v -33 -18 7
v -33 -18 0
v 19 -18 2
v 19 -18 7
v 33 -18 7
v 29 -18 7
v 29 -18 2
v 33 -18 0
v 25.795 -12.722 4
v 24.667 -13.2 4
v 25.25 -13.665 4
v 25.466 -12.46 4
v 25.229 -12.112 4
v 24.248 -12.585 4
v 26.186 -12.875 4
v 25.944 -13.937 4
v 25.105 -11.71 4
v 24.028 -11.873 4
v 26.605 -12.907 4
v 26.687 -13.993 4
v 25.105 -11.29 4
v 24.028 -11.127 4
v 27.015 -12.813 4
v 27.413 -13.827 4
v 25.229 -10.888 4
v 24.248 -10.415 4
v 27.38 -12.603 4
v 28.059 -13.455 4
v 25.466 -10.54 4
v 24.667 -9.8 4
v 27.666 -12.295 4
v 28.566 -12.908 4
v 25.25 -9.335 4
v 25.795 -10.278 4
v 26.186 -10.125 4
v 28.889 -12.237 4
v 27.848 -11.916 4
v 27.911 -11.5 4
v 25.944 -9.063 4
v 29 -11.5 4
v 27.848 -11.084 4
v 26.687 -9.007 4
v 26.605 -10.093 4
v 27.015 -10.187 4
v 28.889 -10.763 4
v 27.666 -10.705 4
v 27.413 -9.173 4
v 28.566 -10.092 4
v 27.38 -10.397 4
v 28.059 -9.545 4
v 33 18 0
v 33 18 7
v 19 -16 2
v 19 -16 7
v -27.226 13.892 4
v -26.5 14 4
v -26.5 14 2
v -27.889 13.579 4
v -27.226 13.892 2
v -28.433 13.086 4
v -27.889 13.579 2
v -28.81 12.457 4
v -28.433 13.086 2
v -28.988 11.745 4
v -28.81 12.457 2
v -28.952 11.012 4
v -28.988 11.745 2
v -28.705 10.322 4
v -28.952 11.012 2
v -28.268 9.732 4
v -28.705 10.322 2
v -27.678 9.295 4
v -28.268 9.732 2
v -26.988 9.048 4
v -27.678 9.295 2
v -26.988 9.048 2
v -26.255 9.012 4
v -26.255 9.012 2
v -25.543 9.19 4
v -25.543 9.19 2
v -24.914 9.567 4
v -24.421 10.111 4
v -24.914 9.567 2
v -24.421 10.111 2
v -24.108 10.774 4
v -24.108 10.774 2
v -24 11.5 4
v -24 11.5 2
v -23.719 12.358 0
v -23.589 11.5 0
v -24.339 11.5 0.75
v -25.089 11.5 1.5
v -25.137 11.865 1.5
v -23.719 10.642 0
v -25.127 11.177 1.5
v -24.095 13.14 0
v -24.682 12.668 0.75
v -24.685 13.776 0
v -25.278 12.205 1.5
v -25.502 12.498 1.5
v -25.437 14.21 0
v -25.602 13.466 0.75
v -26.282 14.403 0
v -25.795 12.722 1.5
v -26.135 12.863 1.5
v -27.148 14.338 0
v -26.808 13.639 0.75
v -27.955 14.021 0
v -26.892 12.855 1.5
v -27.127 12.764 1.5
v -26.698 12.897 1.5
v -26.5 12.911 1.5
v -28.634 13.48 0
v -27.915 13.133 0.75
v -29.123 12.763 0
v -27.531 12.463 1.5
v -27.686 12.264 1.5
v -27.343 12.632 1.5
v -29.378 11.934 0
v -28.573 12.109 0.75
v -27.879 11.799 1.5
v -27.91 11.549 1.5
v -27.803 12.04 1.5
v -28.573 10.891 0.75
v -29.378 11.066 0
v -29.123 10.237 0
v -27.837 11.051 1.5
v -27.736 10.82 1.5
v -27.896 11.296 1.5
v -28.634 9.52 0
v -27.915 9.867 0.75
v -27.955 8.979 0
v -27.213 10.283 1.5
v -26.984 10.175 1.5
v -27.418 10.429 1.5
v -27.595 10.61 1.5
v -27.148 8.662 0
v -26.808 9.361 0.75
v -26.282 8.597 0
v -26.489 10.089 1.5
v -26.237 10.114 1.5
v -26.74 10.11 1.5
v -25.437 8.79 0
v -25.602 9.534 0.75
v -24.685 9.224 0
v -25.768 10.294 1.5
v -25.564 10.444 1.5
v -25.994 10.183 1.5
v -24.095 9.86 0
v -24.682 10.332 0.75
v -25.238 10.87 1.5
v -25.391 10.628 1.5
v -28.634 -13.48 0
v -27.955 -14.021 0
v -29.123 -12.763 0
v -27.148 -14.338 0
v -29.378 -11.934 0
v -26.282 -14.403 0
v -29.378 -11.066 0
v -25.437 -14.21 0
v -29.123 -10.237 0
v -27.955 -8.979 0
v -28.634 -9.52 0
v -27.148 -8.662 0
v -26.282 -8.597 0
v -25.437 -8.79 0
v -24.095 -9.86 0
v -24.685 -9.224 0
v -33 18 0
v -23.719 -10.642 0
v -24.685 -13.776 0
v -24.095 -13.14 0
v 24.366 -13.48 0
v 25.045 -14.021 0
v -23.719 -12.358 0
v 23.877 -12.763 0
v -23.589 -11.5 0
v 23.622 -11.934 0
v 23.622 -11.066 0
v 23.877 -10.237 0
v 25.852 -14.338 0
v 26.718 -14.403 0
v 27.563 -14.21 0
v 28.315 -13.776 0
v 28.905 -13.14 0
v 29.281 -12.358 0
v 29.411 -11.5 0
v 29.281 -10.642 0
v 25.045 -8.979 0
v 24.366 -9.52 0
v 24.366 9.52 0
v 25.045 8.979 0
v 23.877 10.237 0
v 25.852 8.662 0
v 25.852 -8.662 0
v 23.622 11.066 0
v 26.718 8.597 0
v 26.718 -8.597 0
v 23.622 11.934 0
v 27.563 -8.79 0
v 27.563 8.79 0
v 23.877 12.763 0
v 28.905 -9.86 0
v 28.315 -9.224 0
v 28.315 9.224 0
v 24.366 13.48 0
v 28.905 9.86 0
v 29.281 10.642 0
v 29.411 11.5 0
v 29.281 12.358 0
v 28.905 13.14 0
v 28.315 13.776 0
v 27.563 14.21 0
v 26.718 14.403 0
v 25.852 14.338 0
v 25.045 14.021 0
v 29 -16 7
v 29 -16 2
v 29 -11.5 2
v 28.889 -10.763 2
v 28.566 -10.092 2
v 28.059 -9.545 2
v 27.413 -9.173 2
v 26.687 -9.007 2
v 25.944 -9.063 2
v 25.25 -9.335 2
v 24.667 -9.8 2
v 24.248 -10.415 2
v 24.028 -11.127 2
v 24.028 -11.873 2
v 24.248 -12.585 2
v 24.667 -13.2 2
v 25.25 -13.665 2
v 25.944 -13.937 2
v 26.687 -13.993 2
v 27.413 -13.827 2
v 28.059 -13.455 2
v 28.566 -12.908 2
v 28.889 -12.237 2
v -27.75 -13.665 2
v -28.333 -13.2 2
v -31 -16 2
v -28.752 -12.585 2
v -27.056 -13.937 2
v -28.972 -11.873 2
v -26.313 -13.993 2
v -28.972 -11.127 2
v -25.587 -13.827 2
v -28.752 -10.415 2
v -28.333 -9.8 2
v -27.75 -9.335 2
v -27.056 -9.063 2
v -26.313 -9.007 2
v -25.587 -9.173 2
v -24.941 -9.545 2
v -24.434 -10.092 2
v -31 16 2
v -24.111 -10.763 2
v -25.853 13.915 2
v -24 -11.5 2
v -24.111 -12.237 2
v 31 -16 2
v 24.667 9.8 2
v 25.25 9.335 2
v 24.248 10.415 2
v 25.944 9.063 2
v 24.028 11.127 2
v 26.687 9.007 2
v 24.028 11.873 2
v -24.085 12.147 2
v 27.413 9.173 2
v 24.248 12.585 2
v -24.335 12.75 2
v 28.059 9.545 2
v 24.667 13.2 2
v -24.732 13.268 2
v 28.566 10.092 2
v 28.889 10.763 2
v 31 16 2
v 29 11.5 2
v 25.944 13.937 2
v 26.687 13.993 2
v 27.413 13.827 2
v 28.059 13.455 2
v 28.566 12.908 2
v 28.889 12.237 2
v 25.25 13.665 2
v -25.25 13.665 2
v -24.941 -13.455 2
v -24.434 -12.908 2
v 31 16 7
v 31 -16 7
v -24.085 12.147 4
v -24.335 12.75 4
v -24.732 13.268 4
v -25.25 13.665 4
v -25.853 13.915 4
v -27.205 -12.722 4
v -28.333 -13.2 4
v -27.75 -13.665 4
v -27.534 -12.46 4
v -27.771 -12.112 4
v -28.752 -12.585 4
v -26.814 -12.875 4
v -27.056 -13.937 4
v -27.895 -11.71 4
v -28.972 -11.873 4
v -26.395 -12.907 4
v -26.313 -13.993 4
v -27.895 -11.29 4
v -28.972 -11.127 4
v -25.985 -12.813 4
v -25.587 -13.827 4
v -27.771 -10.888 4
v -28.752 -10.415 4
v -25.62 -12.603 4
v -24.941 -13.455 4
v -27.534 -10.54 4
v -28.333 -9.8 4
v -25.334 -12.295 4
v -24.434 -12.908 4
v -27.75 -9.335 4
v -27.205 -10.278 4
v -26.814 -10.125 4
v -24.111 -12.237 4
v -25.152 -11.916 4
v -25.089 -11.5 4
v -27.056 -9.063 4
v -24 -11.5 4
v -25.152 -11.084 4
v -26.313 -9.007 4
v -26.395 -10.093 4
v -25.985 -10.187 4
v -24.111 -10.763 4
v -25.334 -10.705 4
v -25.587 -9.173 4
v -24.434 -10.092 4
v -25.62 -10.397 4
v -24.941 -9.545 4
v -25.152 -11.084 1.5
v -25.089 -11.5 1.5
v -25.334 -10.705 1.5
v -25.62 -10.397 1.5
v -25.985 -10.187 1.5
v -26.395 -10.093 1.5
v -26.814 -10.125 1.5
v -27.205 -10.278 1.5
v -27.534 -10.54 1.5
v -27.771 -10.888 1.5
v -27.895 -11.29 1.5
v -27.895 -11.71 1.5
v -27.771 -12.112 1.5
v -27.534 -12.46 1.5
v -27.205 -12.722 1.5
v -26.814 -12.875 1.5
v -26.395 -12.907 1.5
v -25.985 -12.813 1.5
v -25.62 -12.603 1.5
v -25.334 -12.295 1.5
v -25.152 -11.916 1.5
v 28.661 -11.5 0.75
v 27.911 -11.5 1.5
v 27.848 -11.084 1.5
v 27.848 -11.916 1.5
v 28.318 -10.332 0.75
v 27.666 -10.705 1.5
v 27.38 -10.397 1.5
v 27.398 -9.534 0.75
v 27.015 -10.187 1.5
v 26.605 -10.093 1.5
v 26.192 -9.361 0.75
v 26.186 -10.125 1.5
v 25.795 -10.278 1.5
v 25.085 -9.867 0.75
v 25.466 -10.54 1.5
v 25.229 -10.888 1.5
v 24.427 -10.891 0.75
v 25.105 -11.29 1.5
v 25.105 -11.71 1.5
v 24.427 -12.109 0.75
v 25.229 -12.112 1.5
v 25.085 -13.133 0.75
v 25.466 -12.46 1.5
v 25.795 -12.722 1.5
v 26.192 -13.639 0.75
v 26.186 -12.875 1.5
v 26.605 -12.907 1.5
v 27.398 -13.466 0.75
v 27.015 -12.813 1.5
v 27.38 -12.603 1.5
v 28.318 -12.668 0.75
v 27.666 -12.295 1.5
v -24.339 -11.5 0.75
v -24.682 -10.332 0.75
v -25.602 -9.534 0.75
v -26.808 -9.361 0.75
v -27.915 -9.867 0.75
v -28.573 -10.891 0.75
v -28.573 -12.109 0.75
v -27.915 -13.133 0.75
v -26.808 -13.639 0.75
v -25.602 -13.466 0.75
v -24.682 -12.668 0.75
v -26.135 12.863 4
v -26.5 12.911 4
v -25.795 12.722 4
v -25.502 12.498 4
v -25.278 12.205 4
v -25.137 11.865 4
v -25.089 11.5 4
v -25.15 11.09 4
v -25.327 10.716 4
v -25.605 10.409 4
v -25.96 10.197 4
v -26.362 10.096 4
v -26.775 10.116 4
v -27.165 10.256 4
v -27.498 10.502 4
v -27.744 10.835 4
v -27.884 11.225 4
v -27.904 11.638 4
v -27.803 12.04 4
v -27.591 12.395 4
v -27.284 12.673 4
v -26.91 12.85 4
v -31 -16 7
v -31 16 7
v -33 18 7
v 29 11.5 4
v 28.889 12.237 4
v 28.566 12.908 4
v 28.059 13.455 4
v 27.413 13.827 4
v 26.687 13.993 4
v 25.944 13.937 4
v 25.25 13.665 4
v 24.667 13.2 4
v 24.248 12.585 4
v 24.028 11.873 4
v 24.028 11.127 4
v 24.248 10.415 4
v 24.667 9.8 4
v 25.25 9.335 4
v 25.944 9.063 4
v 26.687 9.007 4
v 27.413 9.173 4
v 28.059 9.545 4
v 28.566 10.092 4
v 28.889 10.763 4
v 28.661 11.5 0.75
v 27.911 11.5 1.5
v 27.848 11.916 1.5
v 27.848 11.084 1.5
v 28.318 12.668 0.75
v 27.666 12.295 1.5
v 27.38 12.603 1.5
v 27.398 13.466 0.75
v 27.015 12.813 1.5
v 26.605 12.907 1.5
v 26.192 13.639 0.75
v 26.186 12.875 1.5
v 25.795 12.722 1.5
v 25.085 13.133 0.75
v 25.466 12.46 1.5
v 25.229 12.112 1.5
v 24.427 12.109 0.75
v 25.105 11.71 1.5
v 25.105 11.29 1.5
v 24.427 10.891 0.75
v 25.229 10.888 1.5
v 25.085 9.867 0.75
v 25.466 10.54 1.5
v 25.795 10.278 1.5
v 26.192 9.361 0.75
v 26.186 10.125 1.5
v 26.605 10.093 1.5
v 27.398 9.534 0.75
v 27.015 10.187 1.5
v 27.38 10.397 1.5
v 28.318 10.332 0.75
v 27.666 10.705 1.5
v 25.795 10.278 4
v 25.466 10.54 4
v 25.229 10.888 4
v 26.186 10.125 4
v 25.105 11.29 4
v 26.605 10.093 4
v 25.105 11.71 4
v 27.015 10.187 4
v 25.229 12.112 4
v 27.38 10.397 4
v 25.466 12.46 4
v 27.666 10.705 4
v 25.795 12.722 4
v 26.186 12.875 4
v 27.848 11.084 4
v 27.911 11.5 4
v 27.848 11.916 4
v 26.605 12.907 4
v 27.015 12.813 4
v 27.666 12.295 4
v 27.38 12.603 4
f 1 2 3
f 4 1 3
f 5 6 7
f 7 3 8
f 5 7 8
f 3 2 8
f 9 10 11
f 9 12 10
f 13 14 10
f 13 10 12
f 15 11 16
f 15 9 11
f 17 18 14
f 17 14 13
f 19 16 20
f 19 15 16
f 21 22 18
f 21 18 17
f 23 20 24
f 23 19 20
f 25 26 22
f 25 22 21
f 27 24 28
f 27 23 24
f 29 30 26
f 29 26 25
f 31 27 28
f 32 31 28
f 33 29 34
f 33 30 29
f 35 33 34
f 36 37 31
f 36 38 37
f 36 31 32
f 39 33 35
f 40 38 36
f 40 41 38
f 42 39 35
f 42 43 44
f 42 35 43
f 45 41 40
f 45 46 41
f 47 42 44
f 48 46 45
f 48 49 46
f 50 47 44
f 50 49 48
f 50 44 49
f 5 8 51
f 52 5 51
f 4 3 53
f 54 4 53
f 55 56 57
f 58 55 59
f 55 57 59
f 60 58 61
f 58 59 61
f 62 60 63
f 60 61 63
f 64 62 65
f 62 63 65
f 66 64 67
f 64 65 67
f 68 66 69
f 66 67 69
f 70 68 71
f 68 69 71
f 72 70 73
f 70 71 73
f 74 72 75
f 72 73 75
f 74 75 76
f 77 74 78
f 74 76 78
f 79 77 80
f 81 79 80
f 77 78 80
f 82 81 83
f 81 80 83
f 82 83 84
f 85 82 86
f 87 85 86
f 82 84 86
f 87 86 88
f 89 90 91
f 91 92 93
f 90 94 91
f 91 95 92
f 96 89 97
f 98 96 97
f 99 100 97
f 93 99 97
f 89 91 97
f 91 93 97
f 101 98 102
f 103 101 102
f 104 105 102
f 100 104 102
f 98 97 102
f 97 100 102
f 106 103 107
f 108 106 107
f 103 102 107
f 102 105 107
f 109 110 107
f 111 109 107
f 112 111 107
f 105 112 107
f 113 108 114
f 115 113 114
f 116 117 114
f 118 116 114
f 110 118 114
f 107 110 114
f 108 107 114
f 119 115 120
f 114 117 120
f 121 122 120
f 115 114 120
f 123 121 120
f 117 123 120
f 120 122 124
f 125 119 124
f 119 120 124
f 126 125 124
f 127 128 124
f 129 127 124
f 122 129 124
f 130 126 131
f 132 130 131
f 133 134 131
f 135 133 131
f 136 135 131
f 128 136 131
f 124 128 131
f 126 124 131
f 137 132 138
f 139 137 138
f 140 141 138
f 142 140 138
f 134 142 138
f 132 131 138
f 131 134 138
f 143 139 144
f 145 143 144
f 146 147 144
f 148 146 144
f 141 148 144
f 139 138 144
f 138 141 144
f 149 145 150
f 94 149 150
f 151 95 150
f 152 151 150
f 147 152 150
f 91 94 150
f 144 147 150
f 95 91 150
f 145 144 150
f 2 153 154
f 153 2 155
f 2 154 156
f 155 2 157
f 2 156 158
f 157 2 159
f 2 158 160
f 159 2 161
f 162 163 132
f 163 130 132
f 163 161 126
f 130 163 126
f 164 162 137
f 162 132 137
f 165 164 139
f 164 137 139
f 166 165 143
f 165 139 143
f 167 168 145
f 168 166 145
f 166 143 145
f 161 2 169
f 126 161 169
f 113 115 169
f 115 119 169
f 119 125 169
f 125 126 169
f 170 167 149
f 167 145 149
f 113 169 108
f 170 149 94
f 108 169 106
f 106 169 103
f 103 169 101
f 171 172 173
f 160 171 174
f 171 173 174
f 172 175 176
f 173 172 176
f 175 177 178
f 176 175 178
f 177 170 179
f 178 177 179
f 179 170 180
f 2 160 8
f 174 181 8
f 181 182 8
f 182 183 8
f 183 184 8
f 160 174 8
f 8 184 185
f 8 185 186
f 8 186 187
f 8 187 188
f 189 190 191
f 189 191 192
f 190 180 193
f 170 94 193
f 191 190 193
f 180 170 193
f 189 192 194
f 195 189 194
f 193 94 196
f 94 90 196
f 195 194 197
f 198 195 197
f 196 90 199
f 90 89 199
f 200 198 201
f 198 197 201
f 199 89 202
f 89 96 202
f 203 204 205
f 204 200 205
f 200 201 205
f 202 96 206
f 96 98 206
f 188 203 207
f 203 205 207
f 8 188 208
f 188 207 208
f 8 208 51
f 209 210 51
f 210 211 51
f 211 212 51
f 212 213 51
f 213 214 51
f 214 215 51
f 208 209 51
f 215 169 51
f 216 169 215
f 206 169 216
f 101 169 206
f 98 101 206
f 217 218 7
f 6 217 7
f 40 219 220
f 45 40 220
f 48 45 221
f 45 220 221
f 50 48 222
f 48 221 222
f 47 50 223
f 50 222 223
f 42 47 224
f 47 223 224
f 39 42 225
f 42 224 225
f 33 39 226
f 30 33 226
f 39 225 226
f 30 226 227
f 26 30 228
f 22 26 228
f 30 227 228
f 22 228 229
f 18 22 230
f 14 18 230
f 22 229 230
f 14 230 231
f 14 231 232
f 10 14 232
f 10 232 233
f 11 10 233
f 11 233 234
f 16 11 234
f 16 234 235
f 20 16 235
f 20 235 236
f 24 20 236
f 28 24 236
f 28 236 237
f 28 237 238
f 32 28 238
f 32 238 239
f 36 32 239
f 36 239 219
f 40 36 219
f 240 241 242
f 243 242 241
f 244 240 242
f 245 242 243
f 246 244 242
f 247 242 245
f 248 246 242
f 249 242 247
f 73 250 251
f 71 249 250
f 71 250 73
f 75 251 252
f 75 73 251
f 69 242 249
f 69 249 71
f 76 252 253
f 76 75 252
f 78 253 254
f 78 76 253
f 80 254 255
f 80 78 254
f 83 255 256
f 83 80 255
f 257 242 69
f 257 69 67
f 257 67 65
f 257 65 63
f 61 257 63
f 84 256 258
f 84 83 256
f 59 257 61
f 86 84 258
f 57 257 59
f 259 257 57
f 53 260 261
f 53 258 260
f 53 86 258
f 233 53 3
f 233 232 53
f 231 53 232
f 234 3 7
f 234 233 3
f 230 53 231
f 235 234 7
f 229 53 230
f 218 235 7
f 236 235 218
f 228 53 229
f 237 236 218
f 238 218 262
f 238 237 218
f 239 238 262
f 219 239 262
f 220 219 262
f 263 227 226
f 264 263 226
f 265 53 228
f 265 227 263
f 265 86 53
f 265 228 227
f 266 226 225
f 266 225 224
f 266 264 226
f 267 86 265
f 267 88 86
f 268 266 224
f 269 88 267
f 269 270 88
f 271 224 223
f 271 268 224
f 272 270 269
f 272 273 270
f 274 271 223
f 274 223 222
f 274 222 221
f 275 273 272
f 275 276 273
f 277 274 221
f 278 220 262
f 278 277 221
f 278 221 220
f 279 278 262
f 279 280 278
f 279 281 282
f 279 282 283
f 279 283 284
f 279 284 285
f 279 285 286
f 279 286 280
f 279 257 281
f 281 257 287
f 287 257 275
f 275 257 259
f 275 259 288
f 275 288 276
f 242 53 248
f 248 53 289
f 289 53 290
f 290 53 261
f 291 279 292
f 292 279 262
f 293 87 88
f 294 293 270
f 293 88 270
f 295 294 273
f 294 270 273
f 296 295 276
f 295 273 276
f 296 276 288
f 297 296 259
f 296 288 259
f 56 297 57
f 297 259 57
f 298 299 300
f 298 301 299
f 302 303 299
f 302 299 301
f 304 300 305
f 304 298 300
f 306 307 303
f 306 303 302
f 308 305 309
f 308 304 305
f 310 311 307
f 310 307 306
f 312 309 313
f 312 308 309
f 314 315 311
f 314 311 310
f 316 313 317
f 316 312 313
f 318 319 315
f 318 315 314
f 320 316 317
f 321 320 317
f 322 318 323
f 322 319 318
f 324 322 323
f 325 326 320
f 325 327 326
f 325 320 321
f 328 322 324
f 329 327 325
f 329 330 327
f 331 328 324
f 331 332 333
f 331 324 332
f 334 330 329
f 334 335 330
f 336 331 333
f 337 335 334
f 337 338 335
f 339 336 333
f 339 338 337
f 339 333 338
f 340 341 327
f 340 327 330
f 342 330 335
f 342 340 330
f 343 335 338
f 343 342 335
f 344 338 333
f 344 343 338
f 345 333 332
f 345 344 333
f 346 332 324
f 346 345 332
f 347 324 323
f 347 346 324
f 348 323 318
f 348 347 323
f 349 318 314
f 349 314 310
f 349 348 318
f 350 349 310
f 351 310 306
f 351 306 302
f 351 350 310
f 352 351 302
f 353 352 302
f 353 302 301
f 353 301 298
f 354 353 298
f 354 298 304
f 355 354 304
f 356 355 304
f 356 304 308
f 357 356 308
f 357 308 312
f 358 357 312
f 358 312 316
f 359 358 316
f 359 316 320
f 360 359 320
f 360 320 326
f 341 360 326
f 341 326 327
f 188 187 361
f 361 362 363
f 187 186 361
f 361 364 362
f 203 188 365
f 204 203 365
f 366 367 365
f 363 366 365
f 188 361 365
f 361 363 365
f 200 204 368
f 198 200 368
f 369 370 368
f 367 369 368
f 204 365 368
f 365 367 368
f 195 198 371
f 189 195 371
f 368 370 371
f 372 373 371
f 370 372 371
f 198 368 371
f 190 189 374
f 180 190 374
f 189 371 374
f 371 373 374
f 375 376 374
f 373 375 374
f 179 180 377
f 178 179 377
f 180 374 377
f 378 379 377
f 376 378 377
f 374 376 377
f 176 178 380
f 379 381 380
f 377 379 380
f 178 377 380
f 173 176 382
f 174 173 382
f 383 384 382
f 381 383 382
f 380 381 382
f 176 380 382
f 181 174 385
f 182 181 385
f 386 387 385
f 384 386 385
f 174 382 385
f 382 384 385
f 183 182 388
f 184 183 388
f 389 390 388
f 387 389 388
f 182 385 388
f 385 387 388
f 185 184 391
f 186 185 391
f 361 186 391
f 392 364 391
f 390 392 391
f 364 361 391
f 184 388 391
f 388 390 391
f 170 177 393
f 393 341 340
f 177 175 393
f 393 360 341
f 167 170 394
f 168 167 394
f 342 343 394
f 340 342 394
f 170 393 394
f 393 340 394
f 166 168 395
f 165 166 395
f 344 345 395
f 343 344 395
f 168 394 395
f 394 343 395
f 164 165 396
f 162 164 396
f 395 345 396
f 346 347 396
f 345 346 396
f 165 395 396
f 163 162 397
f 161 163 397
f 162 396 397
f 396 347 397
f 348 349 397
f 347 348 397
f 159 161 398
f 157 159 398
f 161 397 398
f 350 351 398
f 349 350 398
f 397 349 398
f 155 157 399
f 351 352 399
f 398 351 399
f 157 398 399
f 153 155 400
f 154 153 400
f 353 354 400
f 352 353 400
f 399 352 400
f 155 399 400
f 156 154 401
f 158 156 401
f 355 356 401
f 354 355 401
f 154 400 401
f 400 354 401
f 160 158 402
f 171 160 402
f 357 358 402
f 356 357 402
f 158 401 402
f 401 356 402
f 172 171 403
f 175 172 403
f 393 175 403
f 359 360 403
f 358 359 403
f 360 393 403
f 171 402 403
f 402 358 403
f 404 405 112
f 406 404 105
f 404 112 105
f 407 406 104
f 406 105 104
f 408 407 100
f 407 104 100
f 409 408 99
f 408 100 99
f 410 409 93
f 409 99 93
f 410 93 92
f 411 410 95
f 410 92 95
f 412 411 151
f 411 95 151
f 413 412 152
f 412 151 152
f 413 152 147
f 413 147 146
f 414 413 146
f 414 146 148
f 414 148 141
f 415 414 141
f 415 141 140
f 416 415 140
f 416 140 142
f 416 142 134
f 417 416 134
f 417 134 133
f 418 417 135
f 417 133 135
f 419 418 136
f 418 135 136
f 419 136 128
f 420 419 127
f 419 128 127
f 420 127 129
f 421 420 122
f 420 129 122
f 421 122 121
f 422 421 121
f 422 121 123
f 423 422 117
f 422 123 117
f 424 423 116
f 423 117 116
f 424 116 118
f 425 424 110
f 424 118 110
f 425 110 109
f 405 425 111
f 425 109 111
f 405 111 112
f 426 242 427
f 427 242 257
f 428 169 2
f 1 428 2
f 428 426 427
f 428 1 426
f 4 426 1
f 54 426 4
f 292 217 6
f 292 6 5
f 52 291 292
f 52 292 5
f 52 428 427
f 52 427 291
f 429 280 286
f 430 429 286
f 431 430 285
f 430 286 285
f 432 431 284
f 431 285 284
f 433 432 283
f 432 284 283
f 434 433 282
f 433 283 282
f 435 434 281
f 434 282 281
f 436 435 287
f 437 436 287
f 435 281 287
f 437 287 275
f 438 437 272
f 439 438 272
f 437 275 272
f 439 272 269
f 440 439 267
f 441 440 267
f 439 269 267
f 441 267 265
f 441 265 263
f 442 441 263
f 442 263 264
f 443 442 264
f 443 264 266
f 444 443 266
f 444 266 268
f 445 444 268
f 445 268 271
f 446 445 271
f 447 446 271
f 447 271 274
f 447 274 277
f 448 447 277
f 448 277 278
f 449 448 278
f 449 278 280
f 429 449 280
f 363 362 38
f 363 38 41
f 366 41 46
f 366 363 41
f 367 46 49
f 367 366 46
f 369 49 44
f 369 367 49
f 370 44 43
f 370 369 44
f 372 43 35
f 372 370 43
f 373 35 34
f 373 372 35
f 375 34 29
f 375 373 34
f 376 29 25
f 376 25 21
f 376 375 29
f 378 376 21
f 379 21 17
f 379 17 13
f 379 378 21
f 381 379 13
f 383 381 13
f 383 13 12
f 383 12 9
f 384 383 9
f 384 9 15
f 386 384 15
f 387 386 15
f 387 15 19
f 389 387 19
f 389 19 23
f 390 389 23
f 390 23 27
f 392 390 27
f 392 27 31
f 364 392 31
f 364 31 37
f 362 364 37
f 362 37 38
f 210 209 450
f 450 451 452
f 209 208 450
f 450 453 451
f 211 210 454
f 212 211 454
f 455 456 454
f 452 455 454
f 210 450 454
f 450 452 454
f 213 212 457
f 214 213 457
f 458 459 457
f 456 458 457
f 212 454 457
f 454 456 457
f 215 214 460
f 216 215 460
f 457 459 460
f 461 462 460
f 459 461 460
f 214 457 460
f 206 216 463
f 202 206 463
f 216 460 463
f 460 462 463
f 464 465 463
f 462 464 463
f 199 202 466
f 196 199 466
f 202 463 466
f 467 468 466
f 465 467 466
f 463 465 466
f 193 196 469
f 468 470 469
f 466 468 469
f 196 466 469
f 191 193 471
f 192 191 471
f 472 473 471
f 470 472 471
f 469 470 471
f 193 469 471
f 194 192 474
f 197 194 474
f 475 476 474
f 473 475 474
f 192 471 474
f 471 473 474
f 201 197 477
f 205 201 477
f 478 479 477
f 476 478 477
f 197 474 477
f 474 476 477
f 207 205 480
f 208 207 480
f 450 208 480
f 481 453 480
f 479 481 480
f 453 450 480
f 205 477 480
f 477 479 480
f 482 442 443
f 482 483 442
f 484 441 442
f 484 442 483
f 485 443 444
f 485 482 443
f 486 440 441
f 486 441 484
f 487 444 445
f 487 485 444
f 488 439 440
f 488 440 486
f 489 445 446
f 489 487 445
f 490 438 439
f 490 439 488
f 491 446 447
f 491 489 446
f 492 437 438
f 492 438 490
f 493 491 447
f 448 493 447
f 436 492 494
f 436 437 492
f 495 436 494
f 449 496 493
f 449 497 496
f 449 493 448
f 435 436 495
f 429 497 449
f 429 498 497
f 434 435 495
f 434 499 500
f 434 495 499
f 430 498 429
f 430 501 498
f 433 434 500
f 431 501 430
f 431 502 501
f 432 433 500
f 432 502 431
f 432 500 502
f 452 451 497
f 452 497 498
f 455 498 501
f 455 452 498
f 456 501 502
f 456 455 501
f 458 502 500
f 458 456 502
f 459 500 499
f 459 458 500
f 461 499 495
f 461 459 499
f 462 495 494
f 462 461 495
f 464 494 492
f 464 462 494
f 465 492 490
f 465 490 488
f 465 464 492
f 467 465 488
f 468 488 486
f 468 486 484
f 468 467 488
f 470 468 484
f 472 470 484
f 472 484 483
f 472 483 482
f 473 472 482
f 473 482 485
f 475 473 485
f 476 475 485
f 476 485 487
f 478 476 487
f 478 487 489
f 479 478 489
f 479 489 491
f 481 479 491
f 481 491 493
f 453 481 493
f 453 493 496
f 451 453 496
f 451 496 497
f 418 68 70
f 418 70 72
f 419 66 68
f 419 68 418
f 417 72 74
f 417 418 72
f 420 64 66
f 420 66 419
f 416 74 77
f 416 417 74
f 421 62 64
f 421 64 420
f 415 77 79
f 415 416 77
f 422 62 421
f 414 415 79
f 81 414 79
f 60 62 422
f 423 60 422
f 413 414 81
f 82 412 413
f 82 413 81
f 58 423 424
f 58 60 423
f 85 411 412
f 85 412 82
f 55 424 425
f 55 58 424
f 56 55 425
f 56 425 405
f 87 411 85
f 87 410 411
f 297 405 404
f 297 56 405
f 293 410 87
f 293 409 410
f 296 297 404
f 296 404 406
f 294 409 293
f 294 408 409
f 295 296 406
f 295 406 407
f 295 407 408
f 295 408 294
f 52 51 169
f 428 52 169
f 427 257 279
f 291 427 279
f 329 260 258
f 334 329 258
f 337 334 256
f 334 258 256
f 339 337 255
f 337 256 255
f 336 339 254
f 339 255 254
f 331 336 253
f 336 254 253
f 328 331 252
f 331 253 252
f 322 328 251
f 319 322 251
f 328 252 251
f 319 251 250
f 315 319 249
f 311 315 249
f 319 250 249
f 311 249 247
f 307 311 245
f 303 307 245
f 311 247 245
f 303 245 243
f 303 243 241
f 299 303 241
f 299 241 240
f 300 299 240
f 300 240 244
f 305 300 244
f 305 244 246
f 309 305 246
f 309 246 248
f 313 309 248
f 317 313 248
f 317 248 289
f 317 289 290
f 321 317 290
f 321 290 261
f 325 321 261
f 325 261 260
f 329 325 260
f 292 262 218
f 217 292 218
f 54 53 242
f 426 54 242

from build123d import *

# Parameters (mm, degrees)
F0_R     = 2.5
F0_R_2   = 1.4107797467
F0_W     = 10
F0_H     = 2
F1_DEPTH = 2
F2_DEPTH = 4
F3_DEPTH = 7


# Not quite as in the source:
# - a fillet or chamfer that OpenCascade refuses, or shapes differently, is made with other operations: its cross-section is extruded or revolved along the edge and cut away or added


with BuildPart() as f1:
    # F0 (on Top) → F1 (new body)
    with BuildSketch(Plane.XY):
        Polygon((19, -18), (19, -16), (10.7328139991, -16), (-31, -16), (-31, 16), (31, 16), (31, -16), (29, -16), (29, -18), (33, -18), (33, 18), (-33, 18), (-33, -18), align=None)
        Polygon((-30, -15), (-30, 15), (-26.5, 15), (30, 15), (30, -15), (29, -15), (29, -16), (31, -16), (31, 16), (-31, 16), (-31, -16), (10.7328139991, -16), (19, -16), (19, -15), align=None)
        Polygon((-26.5, 15), (-30, 15), (-30, -15), (19, -15), (24, -15), (29, -15), (30, -15), (30, 15), align=None)
        with Locations((-26.5, -11.5)):
            Circle(F0_R, mode=Mode.SUBTRACT)
        with Locations((26.5, -11.5)):
            Circle(F0_R, mode=Mode.SUBTRACT)
        with BuildLine():
            ThreePointArc((-24, 11.5), (-28.267766953, 9.732233047), (-26.5, 14))
            ThreePointArc((-26.5, 14), (-24.732233047, 13.267766953), (-24, 11.5))
        make_face(mode=Mode.SUBTRACT)
        with Locations((26.5, 11.5)):
            Circle(F0_R, mode=Mode.SUBTRACT)
        with BuildLine():
            ThreePointArc((-24, 11.5), (-24.732233047, 13.267766953), (-26.5, 14))
            ThreePointArc((-26.5, 14), (-28.267766953, 9.732233047), (-24, 11.5))
        make_face()
        with BuildLine():
            ThreePointArc((-25.0892202533, 11.5), (-27.4975719256, 10.5024280744), (-26.5, 12.9107797467))
            ThreePointArc((-26.5, 12.9107797467), (-25.5024280744, 12.4975719256), (-25.0892202533, 11.5))
        make_face(mode=Mode.SUBTRACT)
        with Locations((-26.5, -11.5)):
            Circle(F0_R)
        with Locations((-26.5, -11.5)):
            Circle(F0_R_2, mode=Mode.SUBTRACT)
        with Locations((26.5, -11.5)):
            Circle(F0_R)
        with Locations((26.5, -11.5)):
            Circle(F0_R_2, mode=Mode.SUBTRACT)
        with Locations((26.5, 11.5)):
            Circle(F0_R)
        with Locations((26.5, 11.5)):
            Circle(F0_R_2, mode=Mode.SUBTRACT)
        Polygon((24, -15), (19, -15), (19, -16), (29, -16), (29, -15), align=None)
        with Locations((24, -17)):
            Rectangle(F0_W, F0_H)
    extrude(amount=F1_DEPTH)

    # F0 (on Top) → F2 (join)
    with BuildSketch(Plane.XY):
        with Locations((-26.5, -11.5)):
            Circle(F0_R)
        with Locations((-26.5, -11.5)):
            Circle(F0_R_2, mode=Mode.SUBTRACT)
        with BuildLine():
            ThreePointArc((-24, 11.5), (-24.732233047, 13.267766953), (-26.5, 14))
            ThreePointArc((-26.5, 14), (-28.267766953, 9.732233047), (-24, 11.5))
        make_face()
        with BuildLine():
            ThreePointArc((-25.0892202533, 11.5), (-27.4975719256, 10.5024280744), (-26.5, 12.9107797467))
            ThreePointArc((-26.5, 12.9107797467), (-25.5024280744, 12.4975719256), (-25.0892202533, 11.5))
        make_face(mode=Mode.SUBTRACT)
        with Locations((26.5, -11.5)):
            Circle(F0_R)
        with Locations((26.5, -11.5)):
            Circle(F0_R_2, mode=Mode.SUBTRACT)
        with Locations((26.5, 11.5)):
            Circle(F0_R)
        with Locations((26.5, 11.5)):
            Circle(F0_R_2, mode=Mode.SUBTRACT)
    extrude(amount=F2_DEPTH)

    # F0 (on Top) → F3 (join)
    with BuildSketch(Plane.XY):
        Polygon((19, -18), (19, -16), (10.7328139991, -16), (-31, -16), (-31, 16), (31, 16), (31, -16), (29, -16), (29, -18), (33, -18), (33, 18), (-33, 18), (-33, -18), align=None)
    extrude(amount=F3_DEPTH)

    # F4: chamfer of 1.5 on 4 edges, made by hand

    # F4_s1 → F4_t2 (revolve, cut)
    with BuildSketch(Plane.XZ.offset(11.5)):
        with BuildLine():
            Line((29.4532061535, -0.0424264069), (27.8683533398, 1.5424264069))
            Line((27.8683533398, 1.5424264069), (27.8383533398, 1.5424264069))
            ThreePointArc((27.8383533398, 1.5424264069), (27.8807797467, 0.7712132034), (27.8807797467, 0))
            Line((27.8807797467, 0), (27.9107797467, -0.03))
            ThreePointArc((27.9107797467, -0.03), (28.6819929501, -0.03), (29.4532061535, -0.0724264069))
            Line((29.4532061535, -0.0724264069), (29.4532061535, -0.0424264069))
        make_face()
    revolve(axis=Axis((26.5, -11.5, 0), (0, 0, 1)), mode=Mode.SUBTRACT)

    # F4_s3 → F4_t4 (revolve, cut)
    with BuildSketch(Plane.XZ.offset(-11.5)):
        with BuildLine():
            Line((29.4532061535, -0.0424264069), (27.8683533398, 1.5424264069))
            Line((27.8683533398, 1.5424264069), (27.8383533398, 1.5424264069))
            ThreePointArc((27.8383533398, 1.5424264069), (27.8807797467, 0.7712132034), (27.8807797467, 0))
            Line((27.8807797467, 0), (27.9107797467, -0.03))
            ThreePointArc((27.9107797467, -0.03), (28.6819929501, -0.03), (29.4532061535, -0.0724264069))
            Line((29.4532061535, -0.0724264069), (29.4532061535, -0.0424264069))
        make_face()
    revolve(axis=Axis((26.5, 11.5, 0), (0, 0, 1)), mode=Mode.SUBTRACT)

    # F4_s5 → F4_t6 (revolve, cut)
    with BuildSketch(Plane.XZ.offset(-11.5)):
        with BuildLine():
            Line((-23.5467938465, -0.0424264069), (-25.1316466602, 1.5424264069))
            Line((-25.1316466602, 1.5424264069), (-25.1616466602, 1.5424264069))
            ThreePointArc((-25.1616466602, 1.5424264069), (-25.1192202533, 0.7712132034), (-25.1192202533, 0))
            Line((-25.1192202533, 0), (-25.0892202533, -0.03))
            ThreePointArc((-25.0892202533, -0.03), (-24.3180070499, -0.03), (-23.5467938465, -0.0724264069))
            Line((-23.5467938465, -0.0724264069), (-23.5467938465, -0.0424264069))
        make_face()
    revolve(axis=Axis((-26.5, 11.5, 0), (0, 0, 1)), mode=Mode.SUBTRACT)

    # F4_s7 → F4_t8 (revolve, cut)
    with BuildSketch(Plane.XZ.offset(11.5)):
        with BuildLine():
            Line((-23.5467938465, -0.0424264069), (-25.1316466602, 1.5424264069))
            Line((-25.1316466602, 1.5424264069), (-25.1616466602, 1.5424264069))
            ThreePointArc((-25.1616466602, 1.5424264069), (-25.1192202533, 0.7712132034), (-25.1192202533, 0))
            Line((-25.1192202533, 0), (-25.0892202533, -0.03))
            ThreePointArc((-25.0892202533, -0.03), (-24.3180070499, -0.03), (-23.5467938465, -0.0724264069))
            Line((-23.5467938465, -0.0724264069), (-23.5467938465, -0.0424264069))
        make_face()
    revolve(axis=Axis((-26.5, -11.5, 0), (0, 0, 1)), mode=Mode.SUBTRACT)


solid = f1.part
